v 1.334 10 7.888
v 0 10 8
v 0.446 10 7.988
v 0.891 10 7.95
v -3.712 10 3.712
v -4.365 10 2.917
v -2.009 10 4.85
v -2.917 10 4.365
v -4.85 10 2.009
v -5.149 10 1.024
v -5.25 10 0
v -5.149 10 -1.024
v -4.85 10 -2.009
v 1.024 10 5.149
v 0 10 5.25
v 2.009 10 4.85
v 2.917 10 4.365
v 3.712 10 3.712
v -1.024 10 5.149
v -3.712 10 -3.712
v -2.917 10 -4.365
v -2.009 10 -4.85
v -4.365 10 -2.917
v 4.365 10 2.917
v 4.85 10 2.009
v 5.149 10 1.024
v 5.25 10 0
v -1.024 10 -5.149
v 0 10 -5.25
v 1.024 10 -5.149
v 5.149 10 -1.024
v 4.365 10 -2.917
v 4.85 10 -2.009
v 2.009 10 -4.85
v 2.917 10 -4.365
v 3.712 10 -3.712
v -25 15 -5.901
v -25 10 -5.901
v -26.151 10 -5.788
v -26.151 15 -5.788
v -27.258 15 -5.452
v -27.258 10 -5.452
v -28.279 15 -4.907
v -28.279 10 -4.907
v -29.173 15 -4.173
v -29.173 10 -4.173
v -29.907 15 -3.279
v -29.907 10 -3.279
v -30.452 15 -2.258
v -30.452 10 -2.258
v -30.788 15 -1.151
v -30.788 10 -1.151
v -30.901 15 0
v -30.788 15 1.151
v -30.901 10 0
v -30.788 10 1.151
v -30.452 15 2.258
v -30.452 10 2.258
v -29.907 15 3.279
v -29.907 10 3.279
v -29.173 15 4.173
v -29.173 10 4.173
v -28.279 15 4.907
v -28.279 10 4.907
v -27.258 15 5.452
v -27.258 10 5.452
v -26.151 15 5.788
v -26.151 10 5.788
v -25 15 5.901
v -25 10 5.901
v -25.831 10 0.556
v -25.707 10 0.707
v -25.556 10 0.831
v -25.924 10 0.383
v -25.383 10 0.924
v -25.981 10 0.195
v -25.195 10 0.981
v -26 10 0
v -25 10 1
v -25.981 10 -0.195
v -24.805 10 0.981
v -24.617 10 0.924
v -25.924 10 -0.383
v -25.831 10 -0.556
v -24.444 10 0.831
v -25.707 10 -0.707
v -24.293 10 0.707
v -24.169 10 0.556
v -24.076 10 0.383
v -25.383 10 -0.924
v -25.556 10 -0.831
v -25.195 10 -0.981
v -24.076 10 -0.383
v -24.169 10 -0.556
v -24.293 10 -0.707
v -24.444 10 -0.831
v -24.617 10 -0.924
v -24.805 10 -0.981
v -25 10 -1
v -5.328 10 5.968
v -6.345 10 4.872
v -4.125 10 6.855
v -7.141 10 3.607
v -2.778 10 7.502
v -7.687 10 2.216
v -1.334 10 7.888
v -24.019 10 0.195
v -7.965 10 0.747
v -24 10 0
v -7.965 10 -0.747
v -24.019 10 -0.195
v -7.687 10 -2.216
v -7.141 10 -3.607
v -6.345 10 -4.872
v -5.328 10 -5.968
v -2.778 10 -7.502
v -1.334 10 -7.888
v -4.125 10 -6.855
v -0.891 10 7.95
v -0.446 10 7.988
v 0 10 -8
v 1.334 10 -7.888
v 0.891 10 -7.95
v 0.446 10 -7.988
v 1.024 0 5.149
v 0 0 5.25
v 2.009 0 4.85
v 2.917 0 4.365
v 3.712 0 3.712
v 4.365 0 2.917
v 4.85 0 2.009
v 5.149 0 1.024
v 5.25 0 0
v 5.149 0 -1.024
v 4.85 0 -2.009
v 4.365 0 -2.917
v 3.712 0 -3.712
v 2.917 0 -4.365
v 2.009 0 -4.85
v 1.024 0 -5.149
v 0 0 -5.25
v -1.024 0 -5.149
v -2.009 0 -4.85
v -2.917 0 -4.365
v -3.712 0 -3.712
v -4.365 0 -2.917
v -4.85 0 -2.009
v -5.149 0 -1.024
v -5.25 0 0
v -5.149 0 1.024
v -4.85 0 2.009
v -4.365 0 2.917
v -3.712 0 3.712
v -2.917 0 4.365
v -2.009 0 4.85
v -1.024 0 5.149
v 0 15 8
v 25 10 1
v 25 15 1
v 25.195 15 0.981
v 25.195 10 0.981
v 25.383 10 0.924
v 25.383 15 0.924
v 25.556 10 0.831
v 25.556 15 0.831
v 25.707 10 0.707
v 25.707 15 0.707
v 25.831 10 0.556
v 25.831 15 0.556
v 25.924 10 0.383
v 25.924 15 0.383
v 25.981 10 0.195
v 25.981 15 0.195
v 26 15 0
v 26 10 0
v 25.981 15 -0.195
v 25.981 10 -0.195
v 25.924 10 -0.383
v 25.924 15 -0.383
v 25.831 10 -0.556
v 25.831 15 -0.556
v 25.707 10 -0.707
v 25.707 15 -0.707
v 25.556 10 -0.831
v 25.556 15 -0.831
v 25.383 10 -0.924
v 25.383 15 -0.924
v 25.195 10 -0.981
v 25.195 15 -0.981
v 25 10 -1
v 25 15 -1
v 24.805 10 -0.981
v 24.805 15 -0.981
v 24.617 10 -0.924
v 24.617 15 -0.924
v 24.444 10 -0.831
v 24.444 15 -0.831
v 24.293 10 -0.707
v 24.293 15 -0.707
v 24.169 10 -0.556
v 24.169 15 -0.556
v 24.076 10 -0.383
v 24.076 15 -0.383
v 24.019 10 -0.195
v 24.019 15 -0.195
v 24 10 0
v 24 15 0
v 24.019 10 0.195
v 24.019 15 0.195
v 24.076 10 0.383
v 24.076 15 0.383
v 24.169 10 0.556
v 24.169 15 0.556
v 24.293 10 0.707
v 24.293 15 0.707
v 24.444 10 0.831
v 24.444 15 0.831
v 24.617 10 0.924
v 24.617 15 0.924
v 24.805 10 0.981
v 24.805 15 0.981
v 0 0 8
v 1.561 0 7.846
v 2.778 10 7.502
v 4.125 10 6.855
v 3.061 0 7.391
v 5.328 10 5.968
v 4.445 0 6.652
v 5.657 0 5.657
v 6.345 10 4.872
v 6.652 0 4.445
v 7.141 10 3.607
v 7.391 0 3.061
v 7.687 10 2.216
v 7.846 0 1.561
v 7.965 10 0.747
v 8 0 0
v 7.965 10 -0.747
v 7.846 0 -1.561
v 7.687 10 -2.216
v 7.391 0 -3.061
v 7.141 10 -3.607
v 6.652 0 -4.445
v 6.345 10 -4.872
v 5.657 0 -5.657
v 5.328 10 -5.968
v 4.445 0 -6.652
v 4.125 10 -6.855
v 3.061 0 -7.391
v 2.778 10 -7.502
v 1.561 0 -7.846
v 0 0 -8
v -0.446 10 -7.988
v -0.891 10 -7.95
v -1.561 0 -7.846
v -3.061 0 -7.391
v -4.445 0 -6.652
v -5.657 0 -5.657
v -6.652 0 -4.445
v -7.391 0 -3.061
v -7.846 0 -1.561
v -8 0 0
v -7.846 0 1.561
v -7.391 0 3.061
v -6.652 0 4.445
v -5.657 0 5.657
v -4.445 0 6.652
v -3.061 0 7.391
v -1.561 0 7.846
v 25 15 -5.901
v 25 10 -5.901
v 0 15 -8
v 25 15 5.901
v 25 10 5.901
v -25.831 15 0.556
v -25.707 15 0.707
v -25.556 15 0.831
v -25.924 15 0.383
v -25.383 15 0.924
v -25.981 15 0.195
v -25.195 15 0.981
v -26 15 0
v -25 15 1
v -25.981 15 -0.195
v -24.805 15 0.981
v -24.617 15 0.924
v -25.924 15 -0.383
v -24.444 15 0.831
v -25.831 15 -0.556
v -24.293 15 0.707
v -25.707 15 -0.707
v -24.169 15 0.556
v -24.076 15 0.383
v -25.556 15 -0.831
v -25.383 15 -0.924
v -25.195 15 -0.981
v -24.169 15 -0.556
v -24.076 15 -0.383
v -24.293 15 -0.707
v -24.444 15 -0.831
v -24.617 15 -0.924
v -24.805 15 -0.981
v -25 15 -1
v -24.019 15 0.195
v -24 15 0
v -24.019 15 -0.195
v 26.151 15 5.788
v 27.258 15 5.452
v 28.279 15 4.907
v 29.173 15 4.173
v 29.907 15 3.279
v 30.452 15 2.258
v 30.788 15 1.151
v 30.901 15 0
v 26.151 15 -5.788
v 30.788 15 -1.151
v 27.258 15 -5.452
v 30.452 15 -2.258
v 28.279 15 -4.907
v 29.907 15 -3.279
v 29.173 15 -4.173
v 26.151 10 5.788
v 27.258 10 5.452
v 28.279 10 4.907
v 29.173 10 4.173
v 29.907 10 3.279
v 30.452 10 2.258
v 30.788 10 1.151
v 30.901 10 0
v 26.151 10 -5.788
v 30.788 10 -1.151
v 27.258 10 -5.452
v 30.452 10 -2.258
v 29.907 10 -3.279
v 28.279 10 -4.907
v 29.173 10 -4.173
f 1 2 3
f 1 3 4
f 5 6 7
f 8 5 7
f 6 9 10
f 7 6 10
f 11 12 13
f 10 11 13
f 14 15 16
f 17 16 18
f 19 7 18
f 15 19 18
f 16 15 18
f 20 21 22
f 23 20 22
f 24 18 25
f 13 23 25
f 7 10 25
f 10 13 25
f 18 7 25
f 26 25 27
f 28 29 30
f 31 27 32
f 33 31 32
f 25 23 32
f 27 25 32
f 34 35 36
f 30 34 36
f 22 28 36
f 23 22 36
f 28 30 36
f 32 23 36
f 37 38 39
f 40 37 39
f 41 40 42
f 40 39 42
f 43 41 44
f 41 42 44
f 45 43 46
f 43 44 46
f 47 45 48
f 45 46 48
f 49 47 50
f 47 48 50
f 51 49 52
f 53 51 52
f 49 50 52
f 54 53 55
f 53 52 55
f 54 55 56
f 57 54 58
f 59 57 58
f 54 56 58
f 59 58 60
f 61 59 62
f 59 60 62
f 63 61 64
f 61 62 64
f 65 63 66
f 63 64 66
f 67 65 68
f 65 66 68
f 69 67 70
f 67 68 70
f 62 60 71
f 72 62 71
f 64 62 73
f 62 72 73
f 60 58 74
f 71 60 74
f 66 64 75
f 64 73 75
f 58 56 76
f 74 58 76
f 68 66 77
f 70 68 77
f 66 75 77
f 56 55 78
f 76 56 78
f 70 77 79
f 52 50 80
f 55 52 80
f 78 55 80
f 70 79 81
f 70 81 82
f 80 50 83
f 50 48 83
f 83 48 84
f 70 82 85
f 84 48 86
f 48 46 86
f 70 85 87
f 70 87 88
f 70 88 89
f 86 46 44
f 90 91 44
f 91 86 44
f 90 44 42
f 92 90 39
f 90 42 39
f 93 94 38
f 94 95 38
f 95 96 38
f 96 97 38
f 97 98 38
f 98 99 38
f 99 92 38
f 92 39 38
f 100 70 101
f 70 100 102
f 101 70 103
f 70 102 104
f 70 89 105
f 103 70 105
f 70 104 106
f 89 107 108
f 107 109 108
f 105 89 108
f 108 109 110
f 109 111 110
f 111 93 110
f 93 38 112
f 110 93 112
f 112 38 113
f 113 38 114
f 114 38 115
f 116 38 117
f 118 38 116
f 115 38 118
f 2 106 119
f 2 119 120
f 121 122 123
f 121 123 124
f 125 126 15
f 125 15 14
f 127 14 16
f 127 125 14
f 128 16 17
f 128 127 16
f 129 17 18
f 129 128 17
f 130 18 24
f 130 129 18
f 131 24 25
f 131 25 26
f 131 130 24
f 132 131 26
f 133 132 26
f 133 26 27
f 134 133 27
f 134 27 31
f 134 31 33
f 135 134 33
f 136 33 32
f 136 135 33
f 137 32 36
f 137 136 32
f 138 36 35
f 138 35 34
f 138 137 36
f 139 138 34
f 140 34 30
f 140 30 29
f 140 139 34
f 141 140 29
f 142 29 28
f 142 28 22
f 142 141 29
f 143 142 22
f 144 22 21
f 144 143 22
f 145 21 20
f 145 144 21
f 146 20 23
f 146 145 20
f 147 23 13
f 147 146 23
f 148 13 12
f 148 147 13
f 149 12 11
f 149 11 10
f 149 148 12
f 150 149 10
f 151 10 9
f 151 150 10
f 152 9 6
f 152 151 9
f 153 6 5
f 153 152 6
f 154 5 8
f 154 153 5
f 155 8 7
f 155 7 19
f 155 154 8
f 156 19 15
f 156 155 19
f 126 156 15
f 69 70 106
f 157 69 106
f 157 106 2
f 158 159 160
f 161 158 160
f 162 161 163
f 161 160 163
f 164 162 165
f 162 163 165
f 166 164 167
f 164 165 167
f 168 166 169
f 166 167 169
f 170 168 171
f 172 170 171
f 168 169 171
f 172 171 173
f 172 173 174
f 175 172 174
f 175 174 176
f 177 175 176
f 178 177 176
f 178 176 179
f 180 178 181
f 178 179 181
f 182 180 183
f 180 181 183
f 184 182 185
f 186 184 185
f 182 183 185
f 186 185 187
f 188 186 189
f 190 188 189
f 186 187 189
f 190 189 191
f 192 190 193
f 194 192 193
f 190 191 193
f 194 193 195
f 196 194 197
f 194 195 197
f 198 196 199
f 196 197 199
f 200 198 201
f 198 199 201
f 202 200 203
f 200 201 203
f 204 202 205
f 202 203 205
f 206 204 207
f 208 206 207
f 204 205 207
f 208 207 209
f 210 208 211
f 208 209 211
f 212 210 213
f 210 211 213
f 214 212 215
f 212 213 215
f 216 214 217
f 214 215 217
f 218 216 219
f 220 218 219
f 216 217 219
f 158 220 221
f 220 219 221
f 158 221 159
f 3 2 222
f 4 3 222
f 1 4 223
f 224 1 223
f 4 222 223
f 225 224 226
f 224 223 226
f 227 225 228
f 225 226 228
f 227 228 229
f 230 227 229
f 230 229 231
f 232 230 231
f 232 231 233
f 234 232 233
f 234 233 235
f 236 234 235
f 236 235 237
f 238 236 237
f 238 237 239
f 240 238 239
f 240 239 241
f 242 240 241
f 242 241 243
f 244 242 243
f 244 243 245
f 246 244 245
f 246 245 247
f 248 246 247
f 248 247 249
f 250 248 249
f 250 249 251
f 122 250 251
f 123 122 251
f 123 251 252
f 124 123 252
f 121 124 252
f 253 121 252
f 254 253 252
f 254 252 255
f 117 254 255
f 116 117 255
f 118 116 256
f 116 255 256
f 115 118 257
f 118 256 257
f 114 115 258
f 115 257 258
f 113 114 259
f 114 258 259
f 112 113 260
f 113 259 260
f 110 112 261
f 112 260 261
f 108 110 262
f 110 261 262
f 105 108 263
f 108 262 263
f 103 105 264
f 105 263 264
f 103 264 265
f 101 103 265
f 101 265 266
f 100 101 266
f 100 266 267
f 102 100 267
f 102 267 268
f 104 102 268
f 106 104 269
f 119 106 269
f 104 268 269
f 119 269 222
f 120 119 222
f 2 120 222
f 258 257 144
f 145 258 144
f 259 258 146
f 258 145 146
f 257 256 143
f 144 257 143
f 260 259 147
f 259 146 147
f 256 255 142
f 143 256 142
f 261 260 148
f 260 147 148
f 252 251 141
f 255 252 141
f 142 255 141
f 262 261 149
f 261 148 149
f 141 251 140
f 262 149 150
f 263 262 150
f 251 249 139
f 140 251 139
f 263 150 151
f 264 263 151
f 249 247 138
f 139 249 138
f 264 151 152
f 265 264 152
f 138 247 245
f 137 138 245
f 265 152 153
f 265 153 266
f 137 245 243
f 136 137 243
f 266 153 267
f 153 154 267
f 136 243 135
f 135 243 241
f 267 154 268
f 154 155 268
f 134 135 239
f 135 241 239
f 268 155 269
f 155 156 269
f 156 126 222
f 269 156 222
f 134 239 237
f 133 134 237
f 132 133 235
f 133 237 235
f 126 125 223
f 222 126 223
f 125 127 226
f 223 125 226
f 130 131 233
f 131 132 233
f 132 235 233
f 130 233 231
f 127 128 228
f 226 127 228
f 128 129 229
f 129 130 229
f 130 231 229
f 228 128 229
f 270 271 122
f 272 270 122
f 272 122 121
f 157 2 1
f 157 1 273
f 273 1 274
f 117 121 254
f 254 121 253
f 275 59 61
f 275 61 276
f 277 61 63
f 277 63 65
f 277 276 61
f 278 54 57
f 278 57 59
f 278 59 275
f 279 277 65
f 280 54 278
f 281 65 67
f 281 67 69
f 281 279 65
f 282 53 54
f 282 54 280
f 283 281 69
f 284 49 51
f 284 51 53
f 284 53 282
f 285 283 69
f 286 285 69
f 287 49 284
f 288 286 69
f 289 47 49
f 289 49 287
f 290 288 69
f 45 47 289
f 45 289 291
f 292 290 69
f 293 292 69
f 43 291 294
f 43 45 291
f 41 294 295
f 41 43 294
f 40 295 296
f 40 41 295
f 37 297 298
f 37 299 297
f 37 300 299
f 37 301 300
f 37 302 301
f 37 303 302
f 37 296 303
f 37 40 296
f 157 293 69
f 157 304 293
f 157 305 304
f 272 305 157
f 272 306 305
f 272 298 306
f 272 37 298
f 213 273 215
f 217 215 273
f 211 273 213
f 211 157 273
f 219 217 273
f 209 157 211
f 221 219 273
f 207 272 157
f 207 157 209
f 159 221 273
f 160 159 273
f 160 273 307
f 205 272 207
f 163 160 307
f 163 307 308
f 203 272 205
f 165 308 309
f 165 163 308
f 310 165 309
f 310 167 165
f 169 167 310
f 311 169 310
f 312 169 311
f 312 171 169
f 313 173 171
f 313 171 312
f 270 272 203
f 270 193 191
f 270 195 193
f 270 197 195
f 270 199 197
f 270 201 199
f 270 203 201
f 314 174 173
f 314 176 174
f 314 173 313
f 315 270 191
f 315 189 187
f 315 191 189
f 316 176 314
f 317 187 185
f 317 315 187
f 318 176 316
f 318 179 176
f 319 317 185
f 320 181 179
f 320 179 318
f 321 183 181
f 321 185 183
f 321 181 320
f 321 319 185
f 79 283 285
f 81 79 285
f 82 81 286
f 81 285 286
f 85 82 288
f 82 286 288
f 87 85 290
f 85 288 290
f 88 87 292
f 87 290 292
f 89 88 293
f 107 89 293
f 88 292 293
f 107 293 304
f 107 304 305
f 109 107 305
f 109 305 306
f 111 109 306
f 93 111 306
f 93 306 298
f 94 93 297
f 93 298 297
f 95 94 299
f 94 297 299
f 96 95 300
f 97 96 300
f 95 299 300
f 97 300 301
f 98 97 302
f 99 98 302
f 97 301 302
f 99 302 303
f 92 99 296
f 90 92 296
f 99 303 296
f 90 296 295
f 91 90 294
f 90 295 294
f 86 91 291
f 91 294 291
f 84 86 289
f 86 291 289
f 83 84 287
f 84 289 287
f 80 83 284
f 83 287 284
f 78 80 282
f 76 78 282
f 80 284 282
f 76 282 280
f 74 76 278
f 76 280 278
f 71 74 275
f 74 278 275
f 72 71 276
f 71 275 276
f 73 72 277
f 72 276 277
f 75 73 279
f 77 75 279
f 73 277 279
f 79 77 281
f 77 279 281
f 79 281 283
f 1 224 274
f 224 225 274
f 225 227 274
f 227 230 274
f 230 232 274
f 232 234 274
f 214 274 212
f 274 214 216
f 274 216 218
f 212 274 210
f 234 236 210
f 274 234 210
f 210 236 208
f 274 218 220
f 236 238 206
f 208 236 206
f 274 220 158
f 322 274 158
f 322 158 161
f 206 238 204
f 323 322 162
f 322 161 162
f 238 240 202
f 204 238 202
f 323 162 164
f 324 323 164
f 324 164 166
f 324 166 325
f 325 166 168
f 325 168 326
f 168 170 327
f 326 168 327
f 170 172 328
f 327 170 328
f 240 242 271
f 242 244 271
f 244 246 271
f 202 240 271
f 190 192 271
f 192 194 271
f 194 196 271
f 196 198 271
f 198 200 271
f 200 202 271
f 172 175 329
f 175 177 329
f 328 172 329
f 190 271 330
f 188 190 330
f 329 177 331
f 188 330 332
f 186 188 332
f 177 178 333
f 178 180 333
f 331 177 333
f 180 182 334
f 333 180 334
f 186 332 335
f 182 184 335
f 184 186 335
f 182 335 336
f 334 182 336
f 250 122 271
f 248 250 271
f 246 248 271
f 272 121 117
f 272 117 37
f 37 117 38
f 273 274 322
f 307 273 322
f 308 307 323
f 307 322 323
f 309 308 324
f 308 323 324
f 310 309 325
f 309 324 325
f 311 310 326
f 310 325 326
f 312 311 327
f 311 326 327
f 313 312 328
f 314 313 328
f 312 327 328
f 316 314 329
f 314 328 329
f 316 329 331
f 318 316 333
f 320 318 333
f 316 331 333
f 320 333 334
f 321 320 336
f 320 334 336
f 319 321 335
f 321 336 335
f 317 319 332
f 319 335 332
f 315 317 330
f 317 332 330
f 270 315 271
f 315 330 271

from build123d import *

# Parameters (mm, degrees)
SKETCH2_R           = 8
SKETCH2_R_2         = 5.25
BOSS_EXTRUDE1_DEPTH = 10
BOSS_EXTRUDE2_DEPTH = 5
SKETCH4_R           = 1
CUT_EXTRUDE1_DEPTH  = 5


with BuildPart() as part:
    # Sketch2 → Boss-Extrude1 (new body)
    with BuildSketch(Plane(origin=(0, 0, 0), x_dir=(1, 0, 0), z_dir=(0, 1, 0))):
        with Locations(Location((0, 0, 0), (0, 0, 270))):
            Circle(SKETCH2_R)
        with Locations(Location((0, 0, 0), (0, 0, 270))):
            Circle(SKETCH2_R_2, mode=Mode.SUBTRACT)
    extrude(amount=BOSS_EXTRUDE1_DEPTH)

    # Sketch3 → Boss-Extrude2 (add)
    with BuildSketch(Plane(origin=(0, 10, 0), x_dir=(1, 0, 0), z_dir=(0, 1, 0))):
        with BuildLine():
            Line((0, 8), (-25, 5.901469298))
            ThreePointArc((-25, 5.901469298), (-30.901469298, 0), (-25, -5.901469298))
            Line((-25, -5.901469298), (0, -8))
            Line((0, -8), (25, -5.901469298))
            ThreePointArc((25, -5.901469298), (30.901469298, 0), (25, 5.901469298))
            Line((25, 5.901469298), (0, 8))
        make_face()
    extrude(amount=BOSS_EXTRUDE2_DEPTH)

    # Sketch4 → Cut-Extrude1 (cut)
    with BuildSketch(Plane(origin=(0, 15, 0), x_dir=(1, 0, 0), z_dir=(0, 1, 0))):
        with Locations(Location((-25, 0, 0), (0, 0, 270))):
            Circle(SKETCH4_R)
        with Locations(Location((25, 0, 0), (0, 0, 270))):
            Circle(SKETCH4_R)
    extrude(amount=-CUT_EXTRUDE1_DEPTH, mode=Mode.SUBTRACT)


solid = part.part
